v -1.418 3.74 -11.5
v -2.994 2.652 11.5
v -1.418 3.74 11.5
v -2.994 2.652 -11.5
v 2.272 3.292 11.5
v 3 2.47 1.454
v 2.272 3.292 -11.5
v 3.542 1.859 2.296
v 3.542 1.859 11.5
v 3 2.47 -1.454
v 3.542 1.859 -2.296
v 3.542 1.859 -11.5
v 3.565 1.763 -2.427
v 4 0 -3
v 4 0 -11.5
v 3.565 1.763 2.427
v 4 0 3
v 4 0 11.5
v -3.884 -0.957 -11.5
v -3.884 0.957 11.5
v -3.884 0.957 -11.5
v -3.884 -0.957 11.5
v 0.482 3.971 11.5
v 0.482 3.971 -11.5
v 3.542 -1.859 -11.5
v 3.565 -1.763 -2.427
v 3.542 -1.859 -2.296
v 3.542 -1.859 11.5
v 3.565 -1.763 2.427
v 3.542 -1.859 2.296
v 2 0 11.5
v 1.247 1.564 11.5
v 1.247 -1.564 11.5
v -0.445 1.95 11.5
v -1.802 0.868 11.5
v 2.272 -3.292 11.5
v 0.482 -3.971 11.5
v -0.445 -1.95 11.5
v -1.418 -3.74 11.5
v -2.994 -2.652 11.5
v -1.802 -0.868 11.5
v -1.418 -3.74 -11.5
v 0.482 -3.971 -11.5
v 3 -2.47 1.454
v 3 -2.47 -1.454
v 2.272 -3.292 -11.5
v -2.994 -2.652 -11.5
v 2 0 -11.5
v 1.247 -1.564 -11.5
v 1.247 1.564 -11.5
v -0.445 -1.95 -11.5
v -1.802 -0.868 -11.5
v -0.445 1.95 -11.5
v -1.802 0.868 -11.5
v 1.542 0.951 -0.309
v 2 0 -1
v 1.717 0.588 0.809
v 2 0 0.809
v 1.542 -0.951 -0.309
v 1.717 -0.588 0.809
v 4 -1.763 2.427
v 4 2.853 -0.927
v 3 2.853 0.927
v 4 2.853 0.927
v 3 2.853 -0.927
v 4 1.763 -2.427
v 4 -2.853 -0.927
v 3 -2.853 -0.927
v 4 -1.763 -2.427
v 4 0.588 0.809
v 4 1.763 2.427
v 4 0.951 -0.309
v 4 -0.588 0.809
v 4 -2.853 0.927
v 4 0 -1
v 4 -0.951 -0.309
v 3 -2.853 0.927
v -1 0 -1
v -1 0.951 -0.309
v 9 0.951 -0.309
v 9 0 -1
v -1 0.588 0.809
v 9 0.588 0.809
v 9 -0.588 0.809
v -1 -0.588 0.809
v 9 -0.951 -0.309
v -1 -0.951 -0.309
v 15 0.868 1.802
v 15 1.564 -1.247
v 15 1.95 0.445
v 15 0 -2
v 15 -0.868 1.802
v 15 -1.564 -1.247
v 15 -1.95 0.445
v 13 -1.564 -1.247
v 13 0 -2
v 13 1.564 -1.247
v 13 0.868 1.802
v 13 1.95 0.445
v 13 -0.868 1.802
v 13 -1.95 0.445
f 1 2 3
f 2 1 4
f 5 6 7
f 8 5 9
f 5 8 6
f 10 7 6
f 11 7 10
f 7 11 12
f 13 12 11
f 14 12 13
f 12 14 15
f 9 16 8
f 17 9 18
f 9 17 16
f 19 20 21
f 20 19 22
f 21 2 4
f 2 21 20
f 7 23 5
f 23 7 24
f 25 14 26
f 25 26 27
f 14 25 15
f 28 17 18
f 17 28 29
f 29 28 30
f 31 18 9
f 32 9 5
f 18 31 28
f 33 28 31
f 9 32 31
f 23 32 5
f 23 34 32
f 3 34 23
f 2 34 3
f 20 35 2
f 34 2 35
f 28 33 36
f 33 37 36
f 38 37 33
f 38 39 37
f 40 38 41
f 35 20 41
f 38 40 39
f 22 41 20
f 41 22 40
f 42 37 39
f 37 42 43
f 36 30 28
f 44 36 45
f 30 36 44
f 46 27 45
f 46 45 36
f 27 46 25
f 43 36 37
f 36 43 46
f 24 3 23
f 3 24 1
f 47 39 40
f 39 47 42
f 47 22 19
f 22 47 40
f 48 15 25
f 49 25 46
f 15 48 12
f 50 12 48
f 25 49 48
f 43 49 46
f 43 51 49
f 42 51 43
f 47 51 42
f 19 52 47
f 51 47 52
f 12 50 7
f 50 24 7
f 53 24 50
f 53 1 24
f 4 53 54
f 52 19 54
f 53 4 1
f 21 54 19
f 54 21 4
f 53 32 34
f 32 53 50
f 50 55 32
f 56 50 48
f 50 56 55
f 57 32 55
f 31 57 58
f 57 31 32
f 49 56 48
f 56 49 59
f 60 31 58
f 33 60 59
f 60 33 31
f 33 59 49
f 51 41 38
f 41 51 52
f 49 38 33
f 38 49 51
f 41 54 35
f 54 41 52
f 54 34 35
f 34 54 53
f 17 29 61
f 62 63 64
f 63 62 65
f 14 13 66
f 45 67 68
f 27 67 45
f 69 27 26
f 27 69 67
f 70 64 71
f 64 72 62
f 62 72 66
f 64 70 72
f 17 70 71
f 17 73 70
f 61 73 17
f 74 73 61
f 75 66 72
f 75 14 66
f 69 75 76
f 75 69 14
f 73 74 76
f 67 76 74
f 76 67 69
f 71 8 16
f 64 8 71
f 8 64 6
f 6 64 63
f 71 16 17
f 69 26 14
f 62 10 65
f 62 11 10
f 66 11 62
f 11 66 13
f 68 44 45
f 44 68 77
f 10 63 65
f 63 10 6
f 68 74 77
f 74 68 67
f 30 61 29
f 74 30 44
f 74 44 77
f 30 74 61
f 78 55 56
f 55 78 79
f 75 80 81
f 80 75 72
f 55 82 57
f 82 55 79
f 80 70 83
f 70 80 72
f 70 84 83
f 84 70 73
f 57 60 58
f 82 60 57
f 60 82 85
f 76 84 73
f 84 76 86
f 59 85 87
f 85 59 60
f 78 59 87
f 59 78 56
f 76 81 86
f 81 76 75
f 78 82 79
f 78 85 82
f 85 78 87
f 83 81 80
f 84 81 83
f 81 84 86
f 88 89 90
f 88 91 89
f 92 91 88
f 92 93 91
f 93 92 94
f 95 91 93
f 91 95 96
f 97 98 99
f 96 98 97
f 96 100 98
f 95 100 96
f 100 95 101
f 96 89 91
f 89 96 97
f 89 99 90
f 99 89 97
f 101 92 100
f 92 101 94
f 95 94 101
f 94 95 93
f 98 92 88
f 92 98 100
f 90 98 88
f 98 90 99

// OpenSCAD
// Parameters
bore_diameter_mm = 4.0; //[2.0:8.0:0.1]
outer_diameter_mm = 8.0; //[4.0:16.0:0.1]
length_mm = 23.0; //[12.0:46.0:0.5]
bore_radius_mm = 2.0; //[1.0:4.0:0.05]
outer_radius_mm = 4.0; //[2.0:8.0:0.05]
wall_thickness_mm = 2.0; //[1.0:4.0:0.1]
eps_mm = 0.2; //[0.05:0.5:0.05]
overlap_mm = 1.0; //[0.5:2.0:0.1]
screw_shank_radius_mm = 1.0; //[0.6:2.0:0.05]
screw_length_mm = 10.0; //[5.0:20.0:0.5]
screw_head_radius_mm = 2.0; //[1.2:4.0:0.1]
screw_head_height_mm = 2.0; //[1.0:4.0:0.1]
washer_radius_mm = 3.0; //[2.0:6.0:0.1]
washer_thickness_mm = 1.0; //[0.5:2.0:0.1]

// Linear Bearing - complete geometry
module linear_bearing() {
  color([0.85, 0.85, 0.8]) {
    difference() {
      // Outer casing
      cylinder(r=outer_radius_mm, h=length_mm, center=true);
      // Inner bore
      cylinder(r=bore_radius_mm, h=length_mm + 2*eps_mm, center=true);
    }
  }
}

// Screw and Washer - complete geometry
module screw_and_washer() {
  color("DimGray") {
    union() {
      // Washer
      translate([outer_radius_mm + washer_thickness_mm/2 - overlap_mm, 0, 0])
        rotate([0, 90, 0])
        cylinder(r=washer_radius_mm, h=washer_thickness_mm, center=true);
      // Screw shank
      translate([outer_radius_mm + screw_shank_radius_mm - overlap_mm, 0, 0])
        rotate([0, 90, 0])
        cylinder(r=screw_shank_radius_mm, h=screw_length_mm, center=true);
      // Screw head
      translate([outer_radius_mm + screw_length_mm + screw_head_height_mm/2 - overlap_mm, 0, 0])
        rotate([0, 90, 0])
        cylinder(r=screw_head_radius_mm, h=screw_head_height_mm, center=true);
    }
  }
}

// Assembly
module assembly() {
  linear_bearing();
  screw_and_washer();
}

assembly();
